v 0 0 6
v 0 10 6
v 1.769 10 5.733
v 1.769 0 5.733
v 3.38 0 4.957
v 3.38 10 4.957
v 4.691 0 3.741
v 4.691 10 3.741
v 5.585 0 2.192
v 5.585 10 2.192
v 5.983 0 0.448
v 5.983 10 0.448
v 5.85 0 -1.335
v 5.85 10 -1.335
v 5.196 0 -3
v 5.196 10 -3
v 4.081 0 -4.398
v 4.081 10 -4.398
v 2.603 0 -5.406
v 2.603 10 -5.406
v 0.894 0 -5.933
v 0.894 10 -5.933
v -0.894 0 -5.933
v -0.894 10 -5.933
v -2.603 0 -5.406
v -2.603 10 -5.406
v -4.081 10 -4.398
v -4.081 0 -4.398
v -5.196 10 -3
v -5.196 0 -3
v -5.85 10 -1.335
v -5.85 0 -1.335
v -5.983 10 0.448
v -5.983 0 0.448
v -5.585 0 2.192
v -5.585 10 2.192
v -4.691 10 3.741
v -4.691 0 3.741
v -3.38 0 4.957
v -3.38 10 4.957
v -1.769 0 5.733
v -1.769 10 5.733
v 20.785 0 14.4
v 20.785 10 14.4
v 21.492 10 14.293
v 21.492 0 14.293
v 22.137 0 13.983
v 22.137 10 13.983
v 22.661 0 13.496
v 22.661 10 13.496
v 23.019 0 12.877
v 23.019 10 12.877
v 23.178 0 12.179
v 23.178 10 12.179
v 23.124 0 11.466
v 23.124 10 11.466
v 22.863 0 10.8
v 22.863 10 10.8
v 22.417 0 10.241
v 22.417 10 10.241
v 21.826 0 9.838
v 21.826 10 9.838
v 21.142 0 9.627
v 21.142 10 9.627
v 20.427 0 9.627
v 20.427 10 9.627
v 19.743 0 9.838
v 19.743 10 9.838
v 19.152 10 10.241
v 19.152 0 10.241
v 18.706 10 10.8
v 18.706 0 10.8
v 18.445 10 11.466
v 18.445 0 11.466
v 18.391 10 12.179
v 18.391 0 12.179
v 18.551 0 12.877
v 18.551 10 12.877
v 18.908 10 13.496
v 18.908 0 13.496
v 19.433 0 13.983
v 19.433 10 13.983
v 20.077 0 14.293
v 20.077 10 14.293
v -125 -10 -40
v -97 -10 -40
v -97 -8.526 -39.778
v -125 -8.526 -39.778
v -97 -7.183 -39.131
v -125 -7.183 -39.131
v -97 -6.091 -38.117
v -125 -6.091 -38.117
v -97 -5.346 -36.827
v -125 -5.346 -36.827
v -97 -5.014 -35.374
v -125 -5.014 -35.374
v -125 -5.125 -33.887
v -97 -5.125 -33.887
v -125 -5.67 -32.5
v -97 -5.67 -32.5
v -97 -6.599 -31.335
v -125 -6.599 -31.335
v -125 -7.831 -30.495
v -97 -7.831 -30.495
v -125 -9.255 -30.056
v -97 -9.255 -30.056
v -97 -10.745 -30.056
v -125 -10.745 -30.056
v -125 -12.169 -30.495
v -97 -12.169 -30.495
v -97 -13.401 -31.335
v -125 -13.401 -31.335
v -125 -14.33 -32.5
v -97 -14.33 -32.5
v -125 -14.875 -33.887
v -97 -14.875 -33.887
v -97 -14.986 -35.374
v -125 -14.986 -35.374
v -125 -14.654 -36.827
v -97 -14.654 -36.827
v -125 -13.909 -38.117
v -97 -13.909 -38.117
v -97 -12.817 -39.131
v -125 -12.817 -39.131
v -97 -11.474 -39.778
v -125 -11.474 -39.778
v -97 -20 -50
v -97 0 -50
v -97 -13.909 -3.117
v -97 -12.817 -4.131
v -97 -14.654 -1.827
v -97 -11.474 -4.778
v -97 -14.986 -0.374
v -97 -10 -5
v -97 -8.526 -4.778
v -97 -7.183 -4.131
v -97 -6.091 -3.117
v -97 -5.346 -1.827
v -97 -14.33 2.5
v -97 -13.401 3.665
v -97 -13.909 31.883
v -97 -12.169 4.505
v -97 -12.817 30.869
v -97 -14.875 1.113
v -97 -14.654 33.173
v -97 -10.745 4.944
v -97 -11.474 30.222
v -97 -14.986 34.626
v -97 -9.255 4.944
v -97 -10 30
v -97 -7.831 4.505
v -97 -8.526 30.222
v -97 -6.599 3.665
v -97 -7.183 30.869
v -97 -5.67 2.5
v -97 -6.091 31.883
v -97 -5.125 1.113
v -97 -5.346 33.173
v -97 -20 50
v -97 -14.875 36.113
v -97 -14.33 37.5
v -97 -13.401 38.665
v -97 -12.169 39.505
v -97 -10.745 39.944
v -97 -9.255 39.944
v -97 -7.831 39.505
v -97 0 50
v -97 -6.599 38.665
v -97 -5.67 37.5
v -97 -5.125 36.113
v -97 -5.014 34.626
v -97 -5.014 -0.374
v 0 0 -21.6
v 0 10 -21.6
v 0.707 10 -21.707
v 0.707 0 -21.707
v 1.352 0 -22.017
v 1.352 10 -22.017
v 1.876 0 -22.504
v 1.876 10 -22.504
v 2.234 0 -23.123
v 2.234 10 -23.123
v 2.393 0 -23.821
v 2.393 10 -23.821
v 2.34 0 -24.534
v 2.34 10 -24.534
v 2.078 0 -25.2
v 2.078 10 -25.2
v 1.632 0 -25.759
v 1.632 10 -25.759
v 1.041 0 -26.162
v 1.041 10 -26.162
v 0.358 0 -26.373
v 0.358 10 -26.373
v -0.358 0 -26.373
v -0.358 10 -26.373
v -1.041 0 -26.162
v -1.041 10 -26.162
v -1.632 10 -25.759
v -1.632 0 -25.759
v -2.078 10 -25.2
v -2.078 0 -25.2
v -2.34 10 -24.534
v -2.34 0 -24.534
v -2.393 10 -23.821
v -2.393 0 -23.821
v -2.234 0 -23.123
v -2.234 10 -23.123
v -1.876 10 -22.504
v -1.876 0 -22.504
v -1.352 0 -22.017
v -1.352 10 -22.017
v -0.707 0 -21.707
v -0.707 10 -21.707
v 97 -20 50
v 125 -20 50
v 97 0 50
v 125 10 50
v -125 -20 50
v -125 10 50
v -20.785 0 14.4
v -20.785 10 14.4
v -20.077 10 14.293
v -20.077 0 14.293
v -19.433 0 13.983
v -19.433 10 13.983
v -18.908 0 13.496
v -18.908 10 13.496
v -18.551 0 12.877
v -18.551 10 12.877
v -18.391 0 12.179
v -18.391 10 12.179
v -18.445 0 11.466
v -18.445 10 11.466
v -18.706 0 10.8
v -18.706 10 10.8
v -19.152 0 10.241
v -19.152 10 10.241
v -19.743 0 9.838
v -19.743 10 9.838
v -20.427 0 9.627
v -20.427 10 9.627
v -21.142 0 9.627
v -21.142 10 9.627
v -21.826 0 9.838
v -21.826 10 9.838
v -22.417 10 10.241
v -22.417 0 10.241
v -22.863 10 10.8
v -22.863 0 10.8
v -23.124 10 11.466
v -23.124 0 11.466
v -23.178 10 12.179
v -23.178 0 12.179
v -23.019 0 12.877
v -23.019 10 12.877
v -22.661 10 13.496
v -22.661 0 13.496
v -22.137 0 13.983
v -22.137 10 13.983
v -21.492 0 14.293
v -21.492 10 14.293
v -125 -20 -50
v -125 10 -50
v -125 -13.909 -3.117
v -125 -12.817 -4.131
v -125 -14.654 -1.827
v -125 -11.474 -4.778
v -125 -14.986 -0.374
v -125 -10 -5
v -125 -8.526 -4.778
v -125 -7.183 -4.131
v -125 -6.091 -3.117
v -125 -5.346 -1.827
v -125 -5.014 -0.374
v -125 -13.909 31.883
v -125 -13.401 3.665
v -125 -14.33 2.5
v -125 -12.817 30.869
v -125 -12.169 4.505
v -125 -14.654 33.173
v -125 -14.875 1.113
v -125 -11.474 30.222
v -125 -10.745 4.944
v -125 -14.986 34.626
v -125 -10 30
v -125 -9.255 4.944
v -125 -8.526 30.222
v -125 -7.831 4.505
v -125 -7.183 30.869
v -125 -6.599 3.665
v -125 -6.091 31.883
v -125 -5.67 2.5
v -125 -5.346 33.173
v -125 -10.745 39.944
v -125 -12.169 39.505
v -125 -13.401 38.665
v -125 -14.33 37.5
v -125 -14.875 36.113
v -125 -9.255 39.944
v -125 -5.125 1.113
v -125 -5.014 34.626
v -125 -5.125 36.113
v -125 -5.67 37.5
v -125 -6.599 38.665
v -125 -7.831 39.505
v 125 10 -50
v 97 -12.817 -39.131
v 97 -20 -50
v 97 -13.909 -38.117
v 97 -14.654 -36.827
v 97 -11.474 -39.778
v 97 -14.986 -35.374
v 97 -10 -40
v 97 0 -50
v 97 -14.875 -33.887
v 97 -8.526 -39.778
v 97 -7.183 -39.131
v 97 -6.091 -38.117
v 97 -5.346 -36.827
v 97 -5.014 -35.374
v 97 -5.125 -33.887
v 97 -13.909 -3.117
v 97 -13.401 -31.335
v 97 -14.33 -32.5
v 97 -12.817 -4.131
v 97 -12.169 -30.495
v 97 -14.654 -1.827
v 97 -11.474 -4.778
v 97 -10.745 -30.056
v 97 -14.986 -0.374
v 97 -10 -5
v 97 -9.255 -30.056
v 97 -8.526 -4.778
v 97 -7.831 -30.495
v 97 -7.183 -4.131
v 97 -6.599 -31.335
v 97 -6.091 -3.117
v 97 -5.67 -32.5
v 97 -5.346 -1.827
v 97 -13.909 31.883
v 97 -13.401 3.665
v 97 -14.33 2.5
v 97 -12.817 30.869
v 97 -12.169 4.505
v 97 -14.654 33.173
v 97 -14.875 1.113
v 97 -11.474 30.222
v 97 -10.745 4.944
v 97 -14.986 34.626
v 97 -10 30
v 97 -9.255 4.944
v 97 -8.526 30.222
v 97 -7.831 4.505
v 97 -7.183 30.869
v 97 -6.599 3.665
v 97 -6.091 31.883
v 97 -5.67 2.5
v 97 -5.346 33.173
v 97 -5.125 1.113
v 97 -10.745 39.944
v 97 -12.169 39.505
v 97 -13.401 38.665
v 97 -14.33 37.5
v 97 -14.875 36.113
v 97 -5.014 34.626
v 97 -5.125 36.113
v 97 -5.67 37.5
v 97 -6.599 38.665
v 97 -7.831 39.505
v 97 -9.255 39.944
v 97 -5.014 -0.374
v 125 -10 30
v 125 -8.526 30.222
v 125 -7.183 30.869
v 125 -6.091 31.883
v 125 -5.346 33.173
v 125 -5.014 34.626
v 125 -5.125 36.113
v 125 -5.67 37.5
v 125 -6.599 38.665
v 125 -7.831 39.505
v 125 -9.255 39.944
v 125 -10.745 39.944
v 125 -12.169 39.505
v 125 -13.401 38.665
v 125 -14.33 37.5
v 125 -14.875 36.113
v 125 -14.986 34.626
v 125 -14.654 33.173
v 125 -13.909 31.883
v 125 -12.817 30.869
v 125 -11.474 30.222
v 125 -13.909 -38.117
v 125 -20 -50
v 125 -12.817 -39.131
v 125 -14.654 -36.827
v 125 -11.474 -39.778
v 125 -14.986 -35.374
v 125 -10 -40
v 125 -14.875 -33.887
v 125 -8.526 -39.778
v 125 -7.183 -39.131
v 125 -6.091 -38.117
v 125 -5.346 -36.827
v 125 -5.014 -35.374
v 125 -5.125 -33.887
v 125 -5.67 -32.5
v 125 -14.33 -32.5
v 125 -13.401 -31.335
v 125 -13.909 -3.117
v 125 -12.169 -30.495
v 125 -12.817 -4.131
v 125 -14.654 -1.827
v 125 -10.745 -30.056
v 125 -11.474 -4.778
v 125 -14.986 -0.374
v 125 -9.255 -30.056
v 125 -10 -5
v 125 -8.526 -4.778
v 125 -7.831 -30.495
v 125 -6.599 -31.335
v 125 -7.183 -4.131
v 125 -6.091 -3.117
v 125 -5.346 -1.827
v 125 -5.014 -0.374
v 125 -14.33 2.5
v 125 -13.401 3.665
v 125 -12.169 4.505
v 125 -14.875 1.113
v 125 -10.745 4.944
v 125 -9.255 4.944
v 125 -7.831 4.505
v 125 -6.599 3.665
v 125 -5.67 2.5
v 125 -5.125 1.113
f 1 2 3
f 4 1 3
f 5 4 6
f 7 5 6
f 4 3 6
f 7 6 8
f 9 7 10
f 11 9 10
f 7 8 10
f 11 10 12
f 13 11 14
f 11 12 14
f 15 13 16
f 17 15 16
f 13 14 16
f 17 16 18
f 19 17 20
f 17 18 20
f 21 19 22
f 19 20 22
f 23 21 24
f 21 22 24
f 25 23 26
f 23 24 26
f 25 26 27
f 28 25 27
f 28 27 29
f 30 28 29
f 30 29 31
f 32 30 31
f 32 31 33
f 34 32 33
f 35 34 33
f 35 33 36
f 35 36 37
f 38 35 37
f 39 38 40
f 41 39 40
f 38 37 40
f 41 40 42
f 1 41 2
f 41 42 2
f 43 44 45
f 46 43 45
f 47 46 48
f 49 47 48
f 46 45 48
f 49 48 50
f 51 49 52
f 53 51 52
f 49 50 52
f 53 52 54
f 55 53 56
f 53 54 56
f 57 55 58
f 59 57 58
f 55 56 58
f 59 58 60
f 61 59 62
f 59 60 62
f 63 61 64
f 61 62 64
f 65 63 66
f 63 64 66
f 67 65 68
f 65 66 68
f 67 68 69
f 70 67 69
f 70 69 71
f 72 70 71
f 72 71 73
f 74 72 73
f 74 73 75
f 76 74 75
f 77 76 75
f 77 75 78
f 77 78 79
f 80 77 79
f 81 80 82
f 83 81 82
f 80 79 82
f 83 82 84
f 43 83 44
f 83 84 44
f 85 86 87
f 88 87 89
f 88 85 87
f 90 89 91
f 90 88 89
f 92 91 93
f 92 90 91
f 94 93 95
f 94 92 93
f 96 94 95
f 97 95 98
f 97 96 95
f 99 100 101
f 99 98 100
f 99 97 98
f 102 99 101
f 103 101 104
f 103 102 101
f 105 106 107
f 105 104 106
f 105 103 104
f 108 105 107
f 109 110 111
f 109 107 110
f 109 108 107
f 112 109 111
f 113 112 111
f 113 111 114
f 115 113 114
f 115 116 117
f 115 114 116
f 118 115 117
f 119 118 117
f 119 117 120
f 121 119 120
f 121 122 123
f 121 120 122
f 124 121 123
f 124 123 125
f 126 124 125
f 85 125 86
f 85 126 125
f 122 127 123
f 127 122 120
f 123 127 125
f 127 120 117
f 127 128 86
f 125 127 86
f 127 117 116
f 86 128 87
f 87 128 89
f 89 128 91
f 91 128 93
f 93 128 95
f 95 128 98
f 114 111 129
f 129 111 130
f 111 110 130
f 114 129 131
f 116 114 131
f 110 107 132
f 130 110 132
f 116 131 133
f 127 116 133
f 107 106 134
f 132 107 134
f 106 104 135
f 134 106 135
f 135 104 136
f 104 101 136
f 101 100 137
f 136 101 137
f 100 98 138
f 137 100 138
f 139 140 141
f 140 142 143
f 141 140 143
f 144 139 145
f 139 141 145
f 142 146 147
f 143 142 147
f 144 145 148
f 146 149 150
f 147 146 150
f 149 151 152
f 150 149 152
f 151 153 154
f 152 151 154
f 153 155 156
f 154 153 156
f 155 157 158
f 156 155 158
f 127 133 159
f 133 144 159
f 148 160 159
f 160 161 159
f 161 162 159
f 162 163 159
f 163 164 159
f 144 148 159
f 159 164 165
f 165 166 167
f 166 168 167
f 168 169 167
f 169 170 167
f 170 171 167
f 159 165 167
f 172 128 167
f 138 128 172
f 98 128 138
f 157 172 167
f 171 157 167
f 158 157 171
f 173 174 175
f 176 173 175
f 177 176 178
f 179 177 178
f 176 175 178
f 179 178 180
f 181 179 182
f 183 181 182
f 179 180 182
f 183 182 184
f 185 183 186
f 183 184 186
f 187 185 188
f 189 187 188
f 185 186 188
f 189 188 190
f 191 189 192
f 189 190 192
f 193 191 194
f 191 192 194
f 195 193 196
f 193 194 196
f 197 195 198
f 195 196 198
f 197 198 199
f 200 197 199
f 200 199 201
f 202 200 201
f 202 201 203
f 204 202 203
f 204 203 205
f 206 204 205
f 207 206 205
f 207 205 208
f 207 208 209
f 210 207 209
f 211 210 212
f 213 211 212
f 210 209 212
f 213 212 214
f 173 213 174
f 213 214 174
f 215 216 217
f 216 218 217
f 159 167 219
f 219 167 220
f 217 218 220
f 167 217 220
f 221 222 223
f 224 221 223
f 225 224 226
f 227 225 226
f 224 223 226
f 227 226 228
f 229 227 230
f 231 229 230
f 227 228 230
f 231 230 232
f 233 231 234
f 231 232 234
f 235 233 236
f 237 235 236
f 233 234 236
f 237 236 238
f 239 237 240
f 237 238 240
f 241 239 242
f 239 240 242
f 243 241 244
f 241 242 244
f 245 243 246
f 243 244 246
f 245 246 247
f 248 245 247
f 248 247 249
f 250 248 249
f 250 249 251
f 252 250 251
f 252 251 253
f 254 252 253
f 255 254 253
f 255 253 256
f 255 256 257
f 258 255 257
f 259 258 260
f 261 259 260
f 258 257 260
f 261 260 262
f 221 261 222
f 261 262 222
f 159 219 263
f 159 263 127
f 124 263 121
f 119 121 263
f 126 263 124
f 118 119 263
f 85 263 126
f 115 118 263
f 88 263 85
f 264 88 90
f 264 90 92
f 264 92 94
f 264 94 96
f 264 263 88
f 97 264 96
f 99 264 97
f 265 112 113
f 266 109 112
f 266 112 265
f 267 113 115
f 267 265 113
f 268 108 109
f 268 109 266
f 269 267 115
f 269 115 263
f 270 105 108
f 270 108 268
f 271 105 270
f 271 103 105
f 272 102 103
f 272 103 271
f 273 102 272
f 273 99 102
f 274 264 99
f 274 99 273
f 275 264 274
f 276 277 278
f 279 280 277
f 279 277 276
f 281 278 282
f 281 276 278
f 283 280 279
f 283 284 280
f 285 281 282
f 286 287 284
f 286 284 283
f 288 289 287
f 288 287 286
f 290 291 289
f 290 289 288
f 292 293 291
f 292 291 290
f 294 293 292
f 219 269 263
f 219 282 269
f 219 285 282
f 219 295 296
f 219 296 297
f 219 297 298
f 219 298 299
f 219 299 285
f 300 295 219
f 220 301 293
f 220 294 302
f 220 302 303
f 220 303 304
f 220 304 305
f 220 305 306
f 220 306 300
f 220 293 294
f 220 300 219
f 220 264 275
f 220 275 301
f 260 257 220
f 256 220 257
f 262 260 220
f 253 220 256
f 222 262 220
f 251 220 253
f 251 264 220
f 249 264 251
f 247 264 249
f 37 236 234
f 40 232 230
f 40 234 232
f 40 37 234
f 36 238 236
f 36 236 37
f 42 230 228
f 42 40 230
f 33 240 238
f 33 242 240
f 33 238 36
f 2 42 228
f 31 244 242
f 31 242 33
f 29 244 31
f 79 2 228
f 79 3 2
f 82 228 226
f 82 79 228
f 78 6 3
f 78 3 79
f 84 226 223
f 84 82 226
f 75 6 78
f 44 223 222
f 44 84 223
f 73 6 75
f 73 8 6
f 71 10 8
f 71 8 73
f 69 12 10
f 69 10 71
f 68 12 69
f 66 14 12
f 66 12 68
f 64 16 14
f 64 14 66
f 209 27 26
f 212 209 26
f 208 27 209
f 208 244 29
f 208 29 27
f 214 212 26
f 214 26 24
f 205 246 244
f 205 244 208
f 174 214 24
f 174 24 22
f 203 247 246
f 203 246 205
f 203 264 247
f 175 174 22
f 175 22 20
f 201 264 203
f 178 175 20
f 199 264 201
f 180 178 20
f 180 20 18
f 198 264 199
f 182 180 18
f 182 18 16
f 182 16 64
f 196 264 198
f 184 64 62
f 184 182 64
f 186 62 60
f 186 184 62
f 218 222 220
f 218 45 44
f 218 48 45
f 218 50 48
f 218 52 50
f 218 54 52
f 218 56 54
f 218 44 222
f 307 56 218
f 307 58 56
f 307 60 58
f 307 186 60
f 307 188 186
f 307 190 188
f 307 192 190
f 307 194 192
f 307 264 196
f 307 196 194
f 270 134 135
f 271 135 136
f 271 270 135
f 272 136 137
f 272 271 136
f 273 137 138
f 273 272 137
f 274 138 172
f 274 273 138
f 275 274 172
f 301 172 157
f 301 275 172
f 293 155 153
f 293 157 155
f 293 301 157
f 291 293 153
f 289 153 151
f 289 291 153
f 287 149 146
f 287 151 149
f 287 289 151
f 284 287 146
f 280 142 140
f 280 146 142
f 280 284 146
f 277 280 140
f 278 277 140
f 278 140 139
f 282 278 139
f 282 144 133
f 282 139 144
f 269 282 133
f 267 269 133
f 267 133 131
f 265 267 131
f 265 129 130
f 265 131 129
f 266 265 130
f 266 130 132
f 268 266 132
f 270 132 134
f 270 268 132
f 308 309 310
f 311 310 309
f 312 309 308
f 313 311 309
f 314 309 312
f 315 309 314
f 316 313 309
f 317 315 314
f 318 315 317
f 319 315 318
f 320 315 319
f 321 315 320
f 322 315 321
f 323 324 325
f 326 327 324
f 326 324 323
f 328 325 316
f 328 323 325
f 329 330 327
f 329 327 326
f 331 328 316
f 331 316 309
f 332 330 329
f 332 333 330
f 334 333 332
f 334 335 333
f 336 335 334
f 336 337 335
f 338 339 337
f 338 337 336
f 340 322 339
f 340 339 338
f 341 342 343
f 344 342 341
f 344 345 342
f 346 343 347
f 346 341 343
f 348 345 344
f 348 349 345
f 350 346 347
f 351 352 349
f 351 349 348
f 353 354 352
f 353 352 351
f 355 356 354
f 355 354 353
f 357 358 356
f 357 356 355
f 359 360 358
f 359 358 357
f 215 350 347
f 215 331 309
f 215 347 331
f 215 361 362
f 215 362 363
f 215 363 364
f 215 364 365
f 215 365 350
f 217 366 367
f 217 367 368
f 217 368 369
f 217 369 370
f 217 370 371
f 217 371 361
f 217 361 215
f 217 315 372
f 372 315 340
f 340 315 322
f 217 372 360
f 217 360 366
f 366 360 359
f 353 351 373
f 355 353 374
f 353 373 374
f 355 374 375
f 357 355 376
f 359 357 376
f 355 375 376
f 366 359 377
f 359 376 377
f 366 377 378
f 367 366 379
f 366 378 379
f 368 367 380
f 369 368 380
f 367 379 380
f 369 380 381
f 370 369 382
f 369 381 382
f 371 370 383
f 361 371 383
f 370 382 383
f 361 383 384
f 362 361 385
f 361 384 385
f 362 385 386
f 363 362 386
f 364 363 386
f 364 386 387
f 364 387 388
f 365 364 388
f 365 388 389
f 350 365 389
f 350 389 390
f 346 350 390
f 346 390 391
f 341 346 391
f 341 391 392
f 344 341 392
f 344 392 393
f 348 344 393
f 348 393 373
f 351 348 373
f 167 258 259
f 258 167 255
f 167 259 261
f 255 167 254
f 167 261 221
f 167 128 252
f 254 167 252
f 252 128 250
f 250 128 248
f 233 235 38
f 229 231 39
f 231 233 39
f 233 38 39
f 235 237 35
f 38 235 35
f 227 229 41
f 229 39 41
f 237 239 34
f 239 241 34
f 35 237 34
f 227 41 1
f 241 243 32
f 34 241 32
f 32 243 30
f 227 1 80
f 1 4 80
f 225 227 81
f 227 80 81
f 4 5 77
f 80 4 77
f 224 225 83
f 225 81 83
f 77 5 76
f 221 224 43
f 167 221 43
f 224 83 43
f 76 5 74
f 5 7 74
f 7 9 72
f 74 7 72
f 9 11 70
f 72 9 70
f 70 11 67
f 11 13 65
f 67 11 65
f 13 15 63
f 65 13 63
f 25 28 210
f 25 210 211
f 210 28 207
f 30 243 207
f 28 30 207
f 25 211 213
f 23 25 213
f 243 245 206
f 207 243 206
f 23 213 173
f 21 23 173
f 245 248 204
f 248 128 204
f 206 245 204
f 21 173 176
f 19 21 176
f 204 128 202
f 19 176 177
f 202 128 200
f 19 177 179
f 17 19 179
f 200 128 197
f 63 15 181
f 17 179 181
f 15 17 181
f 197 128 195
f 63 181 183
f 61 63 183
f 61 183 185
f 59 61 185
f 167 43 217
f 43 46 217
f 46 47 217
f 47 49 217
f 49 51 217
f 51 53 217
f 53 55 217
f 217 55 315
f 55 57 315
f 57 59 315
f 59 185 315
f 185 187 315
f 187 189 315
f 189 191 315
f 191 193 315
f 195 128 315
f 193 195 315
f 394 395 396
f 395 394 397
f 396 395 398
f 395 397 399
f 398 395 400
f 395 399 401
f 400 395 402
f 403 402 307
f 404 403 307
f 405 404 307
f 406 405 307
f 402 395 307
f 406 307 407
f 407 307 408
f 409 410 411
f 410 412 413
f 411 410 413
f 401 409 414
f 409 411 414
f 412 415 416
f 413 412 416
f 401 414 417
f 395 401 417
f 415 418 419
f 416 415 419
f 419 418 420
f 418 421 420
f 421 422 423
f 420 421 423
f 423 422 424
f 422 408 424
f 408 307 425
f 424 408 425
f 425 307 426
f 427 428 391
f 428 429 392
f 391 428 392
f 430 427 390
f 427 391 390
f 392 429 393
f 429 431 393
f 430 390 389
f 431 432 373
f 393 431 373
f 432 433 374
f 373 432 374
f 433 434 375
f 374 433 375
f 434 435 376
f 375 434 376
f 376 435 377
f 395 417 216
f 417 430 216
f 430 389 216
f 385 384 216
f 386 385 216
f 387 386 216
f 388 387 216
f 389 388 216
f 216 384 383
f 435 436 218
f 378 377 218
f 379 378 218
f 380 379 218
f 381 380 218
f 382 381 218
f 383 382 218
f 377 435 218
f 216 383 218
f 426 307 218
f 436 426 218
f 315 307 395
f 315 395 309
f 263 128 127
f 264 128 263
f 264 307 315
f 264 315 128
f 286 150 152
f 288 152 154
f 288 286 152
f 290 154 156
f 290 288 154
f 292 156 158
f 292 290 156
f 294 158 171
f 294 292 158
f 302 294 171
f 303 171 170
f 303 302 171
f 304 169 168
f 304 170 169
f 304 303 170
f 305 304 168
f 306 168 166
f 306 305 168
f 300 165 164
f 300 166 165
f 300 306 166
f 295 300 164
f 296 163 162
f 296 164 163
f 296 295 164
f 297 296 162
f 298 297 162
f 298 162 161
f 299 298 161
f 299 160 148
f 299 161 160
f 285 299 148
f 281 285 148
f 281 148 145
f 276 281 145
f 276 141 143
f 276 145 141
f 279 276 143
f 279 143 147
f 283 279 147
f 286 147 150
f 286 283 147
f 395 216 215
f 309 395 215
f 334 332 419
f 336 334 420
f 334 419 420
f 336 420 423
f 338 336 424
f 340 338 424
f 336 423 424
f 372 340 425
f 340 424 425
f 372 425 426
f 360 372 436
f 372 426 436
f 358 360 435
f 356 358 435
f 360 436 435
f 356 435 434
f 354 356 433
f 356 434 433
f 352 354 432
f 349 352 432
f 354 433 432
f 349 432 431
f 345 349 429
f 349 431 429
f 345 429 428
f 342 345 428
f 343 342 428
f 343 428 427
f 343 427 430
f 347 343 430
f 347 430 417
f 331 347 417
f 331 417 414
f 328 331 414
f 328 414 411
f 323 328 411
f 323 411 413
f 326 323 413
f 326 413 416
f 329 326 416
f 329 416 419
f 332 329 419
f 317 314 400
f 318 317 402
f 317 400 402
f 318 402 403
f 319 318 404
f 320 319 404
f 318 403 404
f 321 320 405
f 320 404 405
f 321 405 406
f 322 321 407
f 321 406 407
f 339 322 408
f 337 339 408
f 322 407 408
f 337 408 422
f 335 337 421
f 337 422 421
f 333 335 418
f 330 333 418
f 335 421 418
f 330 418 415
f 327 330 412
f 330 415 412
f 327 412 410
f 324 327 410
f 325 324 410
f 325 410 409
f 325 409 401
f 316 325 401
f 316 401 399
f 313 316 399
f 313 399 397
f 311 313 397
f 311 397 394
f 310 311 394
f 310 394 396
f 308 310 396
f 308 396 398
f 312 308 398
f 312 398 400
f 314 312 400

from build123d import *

# Parameters (mm, degrees)
EXTRUDE_1_DEPTH     = 10
SKETCH_4_W          = 28
SKETCH_4_H          = 100
EXTRUDE_2_DEPTH     = 20
SKETCH_5_R          = 5
CUT_EXTRUDE_2_DEPTH = 30
SKETCH_9_R          = 2.4
CUT_EXTRUDE_4_DEPTH = 10
SKETCH_10_R         = 6
CUT_EXTRUDE_5_DEPTH = 10


with BuildPart() as part:
    # 草图1 → 凸台-拉伸1 (new body)
    with BuildSketch(Plane(origin=(0, 0, 0), x_dir=(1, 0, 0), z_dir=(0, 1, 0))):
        Polygon((0, -50), (125, -50), (125, 50), (-125, 50), (-125, -50), align=None)
    extrude(amount=EXTRUDE_1_DEPTH)

    # 草图4 → 凸台-拉伸2 (add)
    with BuildSketch(Plane.XZ):
        with Locations((-111, 0)):
            Rectangle(SKETCH_4_W, SKETCH_4_H)
    extrude_2 = extrude(amount=EXTRUDE_2_DEPTH)

    # 镜向1: 凸台-拉伸2 across plane
    add(extrude_2.mirror(Plane(origin=(0, 0, 0), x_dir=(0, 0, 1), z_dir=(1, 0, 0))))

    # 草图5 → 切除-拉伸2 (cut)
    with BuildSketch(Plane(origin=(125, 0, 0), x_dir=(0, 0, -1), z_dir=(1, 0, 0))):
        with Locations((0, -10)):
            Circle(SKETCH_5_R)
        with Locations((-35, -10)):
            Circle(SKETCH_5_R)
        with Locations((35, -10)):
            Circle(SKETCH_5_R)
    cut_extrude_2 = extrude(amount=-CUT_EXTRUDE_2_DEPTH, mode=Mode.SUBTRACT)

    # 镜向2: 切除-拉伸2 across plane
    add(cut_extrude_2.mirror(Plane(origin=(0, 0, 0), x_dir=(0, 0, 1), z_dir=(1, 0, 0))), mode=Mode.SUBTRACT)

    # 草图9 → 切除-拉伸4 (cut)
    with BuildSketch(Plane(origin=(0, 10, 0), x_dir=(1, 0, 0), z_dir=(0, 1, 0))):
        with Locations(Location((0, 24, 0), (0, 0, 270))):
            Circle(SKETCH_9_R)
        with Locations(Location((20.784609691, -12, 0), (0, 0, 270))):
            Circle(SKETCH_9_R)
        with Locations(Location((-20.784609691, -12, 0), (0, 0, 270))):
            Circle(SKETCH_9_R)
    extrude(amount=-CUT_EXTRUDE_4_DEPTH, mode=Mode.SUBTRACT)

    # 草图10 → 切除-拉伸5 (cut)
    with BuildSketch(Plane(origin=(0, 10, 0), x_dir=(1, 0, 0), z_dir=(0, 1, 0))):
        with Locations(Location((0, 0, 0), (0, 0, 270))):
            Circle(SKETCH_10_R)
    extrude(amount=-CUT_EXTRUDE_5_DEPTH, mode=Mode.SUBTRACT)


solid = part.part
